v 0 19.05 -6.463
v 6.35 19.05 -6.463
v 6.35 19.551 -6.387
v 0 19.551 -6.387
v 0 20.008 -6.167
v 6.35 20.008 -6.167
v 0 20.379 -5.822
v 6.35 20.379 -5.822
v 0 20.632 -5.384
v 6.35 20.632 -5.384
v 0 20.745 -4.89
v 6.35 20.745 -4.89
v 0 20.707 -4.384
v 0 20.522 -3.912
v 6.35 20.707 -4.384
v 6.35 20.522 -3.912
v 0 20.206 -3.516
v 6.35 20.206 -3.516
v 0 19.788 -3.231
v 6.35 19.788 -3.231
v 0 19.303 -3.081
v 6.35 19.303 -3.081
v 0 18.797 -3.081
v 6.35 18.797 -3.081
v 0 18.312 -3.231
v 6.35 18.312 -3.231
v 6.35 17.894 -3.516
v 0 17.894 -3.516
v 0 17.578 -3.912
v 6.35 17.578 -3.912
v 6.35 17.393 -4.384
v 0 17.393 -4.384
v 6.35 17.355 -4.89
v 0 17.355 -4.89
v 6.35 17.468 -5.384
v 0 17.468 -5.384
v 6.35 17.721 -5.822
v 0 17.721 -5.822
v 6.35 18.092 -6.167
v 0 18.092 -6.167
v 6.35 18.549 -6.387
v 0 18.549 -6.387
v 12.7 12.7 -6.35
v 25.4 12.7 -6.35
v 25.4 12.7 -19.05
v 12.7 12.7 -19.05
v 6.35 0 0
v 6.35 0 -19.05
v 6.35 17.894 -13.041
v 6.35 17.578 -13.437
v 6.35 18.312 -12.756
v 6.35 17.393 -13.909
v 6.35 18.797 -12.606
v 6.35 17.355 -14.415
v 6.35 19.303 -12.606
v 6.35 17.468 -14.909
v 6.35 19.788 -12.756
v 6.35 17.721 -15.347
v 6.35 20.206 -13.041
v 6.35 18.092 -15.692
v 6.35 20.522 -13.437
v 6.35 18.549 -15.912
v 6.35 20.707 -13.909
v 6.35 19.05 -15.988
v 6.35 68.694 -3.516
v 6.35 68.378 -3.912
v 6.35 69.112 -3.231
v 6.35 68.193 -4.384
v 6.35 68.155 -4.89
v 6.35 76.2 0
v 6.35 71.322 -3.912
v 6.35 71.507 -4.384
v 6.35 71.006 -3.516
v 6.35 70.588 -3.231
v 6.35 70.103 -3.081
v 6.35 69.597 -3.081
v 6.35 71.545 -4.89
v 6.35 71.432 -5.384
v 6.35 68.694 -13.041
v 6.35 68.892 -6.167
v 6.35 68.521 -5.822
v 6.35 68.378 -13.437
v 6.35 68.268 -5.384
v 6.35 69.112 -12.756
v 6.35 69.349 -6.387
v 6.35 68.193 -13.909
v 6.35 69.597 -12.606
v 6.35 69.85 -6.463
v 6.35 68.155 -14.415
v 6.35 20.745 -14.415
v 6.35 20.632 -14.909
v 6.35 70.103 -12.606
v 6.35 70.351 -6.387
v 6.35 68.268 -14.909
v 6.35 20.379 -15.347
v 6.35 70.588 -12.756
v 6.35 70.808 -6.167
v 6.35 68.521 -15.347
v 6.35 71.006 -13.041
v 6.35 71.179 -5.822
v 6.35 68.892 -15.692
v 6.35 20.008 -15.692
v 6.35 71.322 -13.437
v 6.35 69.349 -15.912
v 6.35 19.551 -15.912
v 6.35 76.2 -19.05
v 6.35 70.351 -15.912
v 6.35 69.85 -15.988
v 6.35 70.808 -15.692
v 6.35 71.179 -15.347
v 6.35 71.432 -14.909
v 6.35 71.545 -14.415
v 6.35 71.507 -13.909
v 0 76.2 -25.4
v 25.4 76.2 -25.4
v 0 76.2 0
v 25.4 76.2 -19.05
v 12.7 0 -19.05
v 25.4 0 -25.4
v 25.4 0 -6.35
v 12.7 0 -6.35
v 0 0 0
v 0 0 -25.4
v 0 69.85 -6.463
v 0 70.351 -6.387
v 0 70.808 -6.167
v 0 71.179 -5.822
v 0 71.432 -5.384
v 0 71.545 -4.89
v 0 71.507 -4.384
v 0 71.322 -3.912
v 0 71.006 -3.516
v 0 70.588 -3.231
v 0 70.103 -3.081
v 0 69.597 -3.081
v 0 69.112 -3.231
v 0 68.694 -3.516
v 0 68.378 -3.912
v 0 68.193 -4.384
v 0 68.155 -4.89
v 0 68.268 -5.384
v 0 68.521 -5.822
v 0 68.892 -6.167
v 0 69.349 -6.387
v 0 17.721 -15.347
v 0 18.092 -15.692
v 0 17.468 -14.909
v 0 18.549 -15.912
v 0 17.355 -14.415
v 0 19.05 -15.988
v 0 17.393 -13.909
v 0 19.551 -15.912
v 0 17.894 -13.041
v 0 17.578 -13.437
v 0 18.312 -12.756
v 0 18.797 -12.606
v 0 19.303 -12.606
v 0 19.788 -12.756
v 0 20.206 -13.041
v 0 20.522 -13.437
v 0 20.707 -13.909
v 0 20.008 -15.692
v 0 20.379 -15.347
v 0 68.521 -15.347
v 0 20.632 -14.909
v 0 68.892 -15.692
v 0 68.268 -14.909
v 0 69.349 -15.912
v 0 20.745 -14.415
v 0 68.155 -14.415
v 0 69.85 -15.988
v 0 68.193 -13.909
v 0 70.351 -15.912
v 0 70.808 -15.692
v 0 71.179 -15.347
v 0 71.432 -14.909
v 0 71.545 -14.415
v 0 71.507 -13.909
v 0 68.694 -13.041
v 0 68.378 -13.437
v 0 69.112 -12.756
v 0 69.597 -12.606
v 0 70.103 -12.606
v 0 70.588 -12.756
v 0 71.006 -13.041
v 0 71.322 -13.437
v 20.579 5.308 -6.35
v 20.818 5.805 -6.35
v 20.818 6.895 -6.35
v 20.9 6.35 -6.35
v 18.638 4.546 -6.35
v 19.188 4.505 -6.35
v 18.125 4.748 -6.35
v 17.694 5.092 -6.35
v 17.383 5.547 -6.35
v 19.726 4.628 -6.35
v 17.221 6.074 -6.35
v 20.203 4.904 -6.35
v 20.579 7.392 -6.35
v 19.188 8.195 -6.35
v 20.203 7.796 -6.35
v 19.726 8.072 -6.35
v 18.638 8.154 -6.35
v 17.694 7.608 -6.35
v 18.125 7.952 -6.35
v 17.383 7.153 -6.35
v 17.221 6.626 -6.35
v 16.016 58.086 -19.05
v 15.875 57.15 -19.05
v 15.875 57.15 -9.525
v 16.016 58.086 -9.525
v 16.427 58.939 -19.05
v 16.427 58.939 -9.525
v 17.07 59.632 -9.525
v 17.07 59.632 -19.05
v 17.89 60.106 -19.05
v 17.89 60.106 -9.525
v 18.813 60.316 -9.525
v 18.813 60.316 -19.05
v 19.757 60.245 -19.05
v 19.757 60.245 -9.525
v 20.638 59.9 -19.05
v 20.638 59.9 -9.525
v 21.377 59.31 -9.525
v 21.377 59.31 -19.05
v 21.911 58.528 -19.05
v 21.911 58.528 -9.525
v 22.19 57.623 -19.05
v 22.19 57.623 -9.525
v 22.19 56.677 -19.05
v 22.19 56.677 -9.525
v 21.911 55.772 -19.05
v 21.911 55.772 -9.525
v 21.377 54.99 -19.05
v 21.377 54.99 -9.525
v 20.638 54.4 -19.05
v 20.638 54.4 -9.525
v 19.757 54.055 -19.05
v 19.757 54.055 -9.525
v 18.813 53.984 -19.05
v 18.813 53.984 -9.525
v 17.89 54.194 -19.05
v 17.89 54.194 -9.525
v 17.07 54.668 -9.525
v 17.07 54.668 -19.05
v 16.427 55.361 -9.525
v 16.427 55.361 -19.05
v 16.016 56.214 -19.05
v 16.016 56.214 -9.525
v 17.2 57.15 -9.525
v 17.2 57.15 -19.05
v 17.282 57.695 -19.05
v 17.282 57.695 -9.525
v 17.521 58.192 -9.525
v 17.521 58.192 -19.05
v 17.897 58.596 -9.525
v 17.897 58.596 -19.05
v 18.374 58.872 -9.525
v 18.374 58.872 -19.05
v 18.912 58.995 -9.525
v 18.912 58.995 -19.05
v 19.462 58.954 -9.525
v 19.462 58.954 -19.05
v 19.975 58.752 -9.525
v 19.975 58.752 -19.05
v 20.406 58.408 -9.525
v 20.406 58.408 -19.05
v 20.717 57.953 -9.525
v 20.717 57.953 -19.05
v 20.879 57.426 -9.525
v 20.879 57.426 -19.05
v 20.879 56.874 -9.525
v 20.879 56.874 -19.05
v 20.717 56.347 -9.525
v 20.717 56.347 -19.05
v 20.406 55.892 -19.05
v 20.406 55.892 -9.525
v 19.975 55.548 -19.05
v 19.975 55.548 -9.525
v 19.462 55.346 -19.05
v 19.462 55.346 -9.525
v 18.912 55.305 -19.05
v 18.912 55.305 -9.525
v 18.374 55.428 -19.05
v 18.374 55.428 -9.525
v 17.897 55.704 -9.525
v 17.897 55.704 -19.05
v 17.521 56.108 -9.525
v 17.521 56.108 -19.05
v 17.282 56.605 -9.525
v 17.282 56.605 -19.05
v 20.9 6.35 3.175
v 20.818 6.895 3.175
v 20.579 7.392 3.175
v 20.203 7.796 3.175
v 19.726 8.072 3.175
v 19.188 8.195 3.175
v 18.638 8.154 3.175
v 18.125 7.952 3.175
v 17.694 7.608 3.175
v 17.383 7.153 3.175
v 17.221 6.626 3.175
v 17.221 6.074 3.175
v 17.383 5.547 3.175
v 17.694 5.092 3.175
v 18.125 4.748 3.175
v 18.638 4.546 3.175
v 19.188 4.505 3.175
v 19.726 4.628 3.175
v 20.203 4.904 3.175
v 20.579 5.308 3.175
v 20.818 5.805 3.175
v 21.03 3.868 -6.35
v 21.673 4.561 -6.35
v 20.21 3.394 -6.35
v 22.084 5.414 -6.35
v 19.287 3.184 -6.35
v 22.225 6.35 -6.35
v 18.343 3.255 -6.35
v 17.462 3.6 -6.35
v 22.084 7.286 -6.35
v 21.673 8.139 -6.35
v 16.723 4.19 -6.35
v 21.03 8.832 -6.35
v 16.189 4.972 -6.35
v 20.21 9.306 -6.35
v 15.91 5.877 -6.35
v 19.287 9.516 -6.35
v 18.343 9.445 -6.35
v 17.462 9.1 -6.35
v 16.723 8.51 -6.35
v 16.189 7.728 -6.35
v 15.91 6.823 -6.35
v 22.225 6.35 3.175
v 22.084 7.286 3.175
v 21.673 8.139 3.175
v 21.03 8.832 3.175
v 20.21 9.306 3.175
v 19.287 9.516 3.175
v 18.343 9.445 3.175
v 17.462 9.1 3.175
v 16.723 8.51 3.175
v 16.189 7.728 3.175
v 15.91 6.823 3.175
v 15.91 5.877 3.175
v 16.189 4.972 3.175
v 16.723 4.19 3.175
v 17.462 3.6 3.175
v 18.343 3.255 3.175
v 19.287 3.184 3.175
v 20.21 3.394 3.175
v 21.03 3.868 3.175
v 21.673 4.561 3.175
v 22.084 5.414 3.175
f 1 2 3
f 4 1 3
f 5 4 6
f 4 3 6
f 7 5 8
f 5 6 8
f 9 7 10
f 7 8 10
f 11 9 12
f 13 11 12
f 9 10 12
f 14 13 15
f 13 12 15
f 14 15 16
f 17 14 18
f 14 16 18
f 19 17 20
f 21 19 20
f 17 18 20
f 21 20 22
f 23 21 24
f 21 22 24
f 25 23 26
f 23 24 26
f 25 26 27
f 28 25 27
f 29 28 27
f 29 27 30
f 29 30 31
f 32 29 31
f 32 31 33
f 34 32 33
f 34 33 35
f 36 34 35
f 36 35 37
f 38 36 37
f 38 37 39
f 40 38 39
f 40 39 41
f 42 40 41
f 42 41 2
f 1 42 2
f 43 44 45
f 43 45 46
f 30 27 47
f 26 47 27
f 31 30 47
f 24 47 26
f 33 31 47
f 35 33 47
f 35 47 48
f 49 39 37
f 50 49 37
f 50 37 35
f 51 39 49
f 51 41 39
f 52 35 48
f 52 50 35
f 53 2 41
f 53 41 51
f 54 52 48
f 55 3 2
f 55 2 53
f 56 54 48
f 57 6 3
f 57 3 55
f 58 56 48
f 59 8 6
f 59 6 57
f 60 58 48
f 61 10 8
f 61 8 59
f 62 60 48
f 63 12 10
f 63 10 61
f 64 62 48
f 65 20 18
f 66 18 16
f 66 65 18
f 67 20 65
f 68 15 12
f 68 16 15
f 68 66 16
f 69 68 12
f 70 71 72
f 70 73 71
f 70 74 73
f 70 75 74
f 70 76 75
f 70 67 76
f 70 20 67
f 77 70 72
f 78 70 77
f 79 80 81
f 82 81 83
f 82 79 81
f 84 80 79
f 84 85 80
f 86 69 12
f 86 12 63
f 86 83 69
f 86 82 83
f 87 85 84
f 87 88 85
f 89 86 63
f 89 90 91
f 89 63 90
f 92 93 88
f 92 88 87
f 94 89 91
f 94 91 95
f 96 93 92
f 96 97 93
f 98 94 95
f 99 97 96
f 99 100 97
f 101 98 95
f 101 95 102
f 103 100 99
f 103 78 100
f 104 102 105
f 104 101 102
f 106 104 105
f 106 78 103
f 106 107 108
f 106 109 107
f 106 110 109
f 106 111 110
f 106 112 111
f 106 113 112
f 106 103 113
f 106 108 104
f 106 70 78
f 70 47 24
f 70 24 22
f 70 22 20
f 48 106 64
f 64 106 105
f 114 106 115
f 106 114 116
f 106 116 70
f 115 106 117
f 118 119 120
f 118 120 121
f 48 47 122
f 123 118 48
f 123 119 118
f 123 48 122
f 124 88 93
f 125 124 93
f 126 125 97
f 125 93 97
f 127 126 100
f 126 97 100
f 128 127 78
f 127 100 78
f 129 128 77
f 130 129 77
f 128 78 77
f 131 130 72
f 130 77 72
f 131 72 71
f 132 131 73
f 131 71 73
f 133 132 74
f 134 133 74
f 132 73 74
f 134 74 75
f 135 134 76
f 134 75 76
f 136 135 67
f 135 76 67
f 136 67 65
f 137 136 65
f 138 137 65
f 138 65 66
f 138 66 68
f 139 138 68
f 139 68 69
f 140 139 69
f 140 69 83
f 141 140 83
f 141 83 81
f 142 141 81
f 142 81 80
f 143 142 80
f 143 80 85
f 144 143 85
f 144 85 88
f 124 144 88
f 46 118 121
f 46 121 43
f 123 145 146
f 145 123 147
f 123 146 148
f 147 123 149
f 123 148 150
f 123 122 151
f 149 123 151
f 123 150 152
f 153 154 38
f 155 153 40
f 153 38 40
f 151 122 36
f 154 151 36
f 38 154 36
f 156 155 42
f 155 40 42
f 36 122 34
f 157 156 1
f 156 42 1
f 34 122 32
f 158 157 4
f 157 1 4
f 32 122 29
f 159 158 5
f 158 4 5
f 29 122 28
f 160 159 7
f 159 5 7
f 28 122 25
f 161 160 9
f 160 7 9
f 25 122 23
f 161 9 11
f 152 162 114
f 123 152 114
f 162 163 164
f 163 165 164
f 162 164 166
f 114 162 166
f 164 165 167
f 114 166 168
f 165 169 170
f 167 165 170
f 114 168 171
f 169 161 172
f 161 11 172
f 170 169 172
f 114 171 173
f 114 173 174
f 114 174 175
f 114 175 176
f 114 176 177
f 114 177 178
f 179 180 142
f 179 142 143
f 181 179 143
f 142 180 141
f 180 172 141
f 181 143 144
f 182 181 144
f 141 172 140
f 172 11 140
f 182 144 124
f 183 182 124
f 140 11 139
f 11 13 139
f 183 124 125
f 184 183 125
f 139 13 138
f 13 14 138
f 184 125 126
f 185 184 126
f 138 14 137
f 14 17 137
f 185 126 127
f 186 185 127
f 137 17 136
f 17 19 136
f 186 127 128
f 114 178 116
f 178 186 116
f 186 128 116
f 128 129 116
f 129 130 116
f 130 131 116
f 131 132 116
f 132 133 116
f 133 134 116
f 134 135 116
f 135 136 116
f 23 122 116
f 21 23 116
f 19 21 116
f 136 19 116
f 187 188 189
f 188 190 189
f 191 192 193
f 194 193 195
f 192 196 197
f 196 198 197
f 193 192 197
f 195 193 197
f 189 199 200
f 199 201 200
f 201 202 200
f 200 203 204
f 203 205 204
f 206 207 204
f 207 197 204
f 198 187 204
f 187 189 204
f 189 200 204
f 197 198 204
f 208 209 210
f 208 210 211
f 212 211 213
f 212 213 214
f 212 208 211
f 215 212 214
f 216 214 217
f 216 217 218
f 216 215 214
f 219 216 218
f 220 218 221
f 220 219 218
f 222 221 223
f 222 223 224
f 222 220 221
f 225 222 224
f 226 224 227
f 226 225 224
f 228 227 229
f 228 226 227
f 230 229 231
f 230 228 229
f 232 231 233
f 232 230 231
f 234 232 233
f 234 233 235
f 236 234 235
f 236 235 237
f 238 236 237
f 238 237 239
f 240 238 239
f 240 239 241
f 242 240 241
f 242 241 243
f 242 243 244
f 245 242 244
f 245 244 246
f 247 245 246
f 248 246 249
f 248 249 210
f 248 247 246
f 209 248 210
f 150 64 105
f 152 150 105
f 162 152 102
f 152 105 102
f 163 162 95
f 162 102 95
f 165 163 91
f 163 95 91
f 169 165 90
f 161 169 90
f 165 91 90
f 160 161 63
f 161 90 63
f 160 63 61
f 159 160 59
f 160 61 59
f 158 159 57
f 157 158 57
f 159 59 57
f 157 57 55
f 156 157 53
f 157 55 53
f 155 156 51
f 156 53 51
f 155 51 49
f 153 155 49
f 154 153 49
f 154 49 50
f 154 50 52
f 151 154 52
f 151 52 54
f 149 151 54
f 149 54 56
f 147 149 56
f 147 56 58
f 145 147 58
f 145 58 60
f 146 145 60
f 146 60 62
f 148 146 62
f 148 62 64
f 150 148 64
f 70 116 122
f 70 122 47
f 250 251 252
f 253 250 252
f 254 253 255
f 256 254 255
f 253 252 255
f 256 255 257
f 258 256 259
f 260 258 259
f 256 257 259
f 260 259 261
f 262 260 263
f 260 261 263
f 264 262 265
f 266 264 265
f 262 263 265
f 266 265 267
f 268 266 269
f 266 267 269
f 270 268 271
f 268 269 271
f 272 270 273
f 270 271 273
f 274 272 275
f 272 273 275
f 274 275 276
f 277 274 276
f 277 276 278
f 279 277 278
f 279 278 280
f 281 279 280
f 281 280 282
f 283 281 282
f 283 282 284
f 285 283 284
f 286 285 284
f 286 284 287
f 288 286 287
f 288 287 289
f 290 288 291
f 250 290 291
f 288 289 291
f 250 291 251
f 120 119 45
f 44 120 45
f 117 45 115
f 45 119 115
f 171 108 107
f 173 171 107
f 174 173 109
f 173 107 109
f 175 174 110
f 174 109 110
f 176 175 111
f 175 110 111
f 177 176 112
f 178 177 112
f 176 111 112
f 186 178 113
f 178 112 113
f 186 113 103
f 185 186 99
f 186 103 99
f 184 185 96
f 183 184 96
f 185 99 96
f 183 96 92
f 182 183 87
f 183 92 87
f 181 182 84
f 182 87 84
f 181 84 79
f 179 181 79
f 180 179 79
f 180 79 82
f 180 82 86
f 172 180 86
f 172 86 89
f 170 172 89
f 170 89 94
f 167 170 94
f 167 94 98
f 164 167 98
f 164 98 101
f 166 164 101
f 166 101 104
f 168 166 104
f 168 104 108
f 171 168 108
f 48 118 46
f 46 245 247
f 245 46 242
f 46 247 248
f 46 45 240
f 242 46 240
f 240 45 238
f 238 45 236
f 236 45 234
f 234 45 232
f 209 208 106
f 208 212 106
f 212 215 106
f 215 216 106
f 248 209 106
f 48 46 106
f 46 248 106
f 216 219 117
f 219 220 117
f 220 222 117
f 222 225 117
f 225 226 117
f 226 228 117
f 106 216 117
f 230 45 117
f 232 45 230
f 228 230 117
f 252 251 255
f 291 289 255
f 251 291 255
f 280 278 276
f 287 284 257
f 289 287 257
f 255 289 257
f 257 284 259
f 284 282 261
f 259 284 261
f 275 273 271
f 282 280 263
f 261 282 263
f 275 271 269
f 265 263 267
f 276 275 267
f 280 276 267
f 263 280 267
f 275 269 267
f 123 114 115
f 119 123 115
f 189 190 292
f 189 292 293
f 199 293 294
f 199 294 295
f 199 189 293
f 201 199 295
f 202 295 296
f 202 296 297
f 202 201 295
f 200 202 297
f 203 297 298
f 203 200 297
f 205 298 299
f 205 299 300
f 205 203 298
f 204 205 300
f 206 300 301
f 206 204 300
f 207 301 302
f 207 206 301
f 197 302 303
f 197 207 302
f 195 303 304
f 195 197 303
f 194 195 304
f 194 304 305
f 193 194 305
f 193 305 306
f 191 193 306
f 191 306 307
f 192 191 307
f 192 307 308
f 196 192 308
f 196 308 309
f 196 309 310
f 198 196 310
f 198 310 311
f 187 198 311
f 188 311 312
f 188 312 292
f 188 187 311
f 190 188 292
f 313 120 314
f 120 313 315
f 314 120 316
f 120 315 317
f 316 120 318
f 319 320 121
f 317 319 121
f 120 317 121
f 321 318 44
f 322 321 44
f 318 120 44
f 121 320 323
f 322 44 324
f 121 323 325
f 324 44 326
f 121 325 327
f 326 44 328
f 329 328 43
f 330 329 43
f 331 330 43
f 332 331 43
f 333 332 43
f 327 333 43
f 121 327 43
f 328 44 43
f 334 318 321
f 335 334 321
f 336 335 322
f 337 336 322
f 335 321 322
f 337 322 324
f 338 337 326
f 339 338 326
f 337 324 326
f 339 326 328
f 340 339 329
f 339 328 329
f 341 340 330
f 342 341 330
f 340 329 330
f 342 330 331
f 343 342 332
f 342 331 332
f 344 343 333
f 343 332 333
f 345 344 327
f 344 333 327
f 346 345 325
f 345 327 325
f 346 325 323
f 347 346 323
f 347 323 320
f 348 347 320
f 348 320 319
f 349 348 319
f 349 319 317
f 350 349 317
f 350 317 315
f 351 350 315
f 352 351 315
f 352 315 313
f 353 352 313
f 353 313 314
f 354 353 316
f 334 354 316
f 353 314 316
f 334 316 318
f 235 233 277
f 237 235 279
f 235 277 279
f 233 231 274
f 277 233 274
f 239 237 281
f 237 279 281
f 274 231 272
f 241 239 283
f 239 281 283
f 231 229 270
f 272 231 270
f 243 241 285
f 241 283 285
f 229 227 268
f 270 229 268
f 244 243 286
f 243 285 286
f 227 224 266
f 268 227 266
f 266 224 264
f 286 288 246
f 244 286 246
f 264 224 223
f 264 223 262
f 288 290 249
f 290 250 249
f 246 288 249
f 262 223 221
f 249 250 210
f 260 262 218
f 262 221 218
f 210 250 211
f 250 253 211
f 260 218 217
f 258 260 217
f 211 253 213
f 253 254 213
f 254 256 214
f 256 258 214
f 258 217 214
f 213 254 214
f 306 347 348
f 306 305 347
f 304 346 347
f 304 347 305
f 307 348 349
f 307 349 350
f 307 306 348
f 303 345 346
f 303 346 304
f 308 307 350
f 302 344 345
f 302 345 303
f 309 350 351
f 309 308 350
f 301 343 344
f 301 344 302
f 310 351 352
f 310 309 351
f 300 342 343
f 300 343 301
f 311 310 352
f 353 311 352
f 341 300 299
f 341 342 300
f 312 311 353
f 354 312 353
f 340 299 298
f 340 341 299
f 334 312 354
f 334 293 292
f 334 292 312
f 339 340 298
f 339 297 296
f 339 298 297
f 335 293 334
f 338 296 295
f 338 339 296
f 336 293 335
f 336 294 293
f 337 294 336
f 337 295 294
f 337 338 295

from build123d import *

# Parameters (mm, degrees)
SKETCH1_W           = 25.4
SKETCH1_H           = 76.2
BOSS_EXTRUDE1_DEPTH = 25.4
SKETCH10_W          = 19.05
SKETCH10_H          = 76.2
CUT_EXTRUDE5_DEPTH  = 19.05
BOSS_EXTRUDE2_START = -6.35
SKETCH12_R          = 3.175
SKETCH12_R_2        = 1.849999983
BOSS_EXTRUDE2_DEPTH = 9.525
BOSS_EXTRUDE3_START = -6.35
SKETCH13_W          = 12.7
SKETCH13_H          = 12.7
BOSS_EXTRUDE3_DEPTH = 12.7
SKETCH14_R          = 3.175
SKETCH14_R_2        = 1.849999983
BOSS_EXTRUDE4_DEPTH = 9.525
SKETCH15_R          = 1.700000029
CUT_EXTRUDE6_DEPTH  = 7.35


with BuildPart() as part:
    # Sketch1 → Boss-Extrude1 (new body)
    with BuildSketch(Plane.XY):
        with Locations((12.7, 38.1)):
            Rectangle(SKETCH1_W, SKETCH1_H)
    extrude(amount=-BOSS_EXTRUDE1_DEPTH)

    # Sketch10 → Cut-Extrude5 (cut)
    with BuildSketch(Plane(origin=(25.4, 0, 0), x_dir=(0, 0, -1), z_dir=(1, 0, 0))):
        with Locations((9.525, 38.1)):
            Rectangle(SKETCH10_W, SKETCH10_H)
    extrude(amount=-CUT_EXTRUDE5_DEPTH, mode=Mode.SUBTRACT)

    # Sketch12 → Boss-Extrude2 (add)
    with BuildSketch(Plane(origin=(0, 0, -25.4), x_dir=(-1, 0, 0), z_dir=(0, 0, -1)).offset(BOSS_EXTRUDE2_START)):
        with Locations((-19.05, 57.15)):
            Circle(SKETCH12_R)
        with Locations((-19.05, 57.15)):
            Circle(SKETCH12_R_2, mode=Mode.SUBTRACT)
    extrude(amount=-BOSS_EXTRUDE2_DEPTH)

    # Sketch13 → Boss-Extrude3 (add)
    with BuildSketch(Plane(origin=(0, 0, -25.4), x_dir=(-1, 0, 0), z_dir=(0, 0, -1)).offset(BOSS_EXTRUDE3_START)):
        with Locations((-19.05, 6.35)):
            Rectangle(SKETCH13_W, SKETCH13_H)
    extrude(amount=-BOSS_EXTRUDE3_DEPTH)

    # Sketch14 → Boss-Extrude4 (add)
    with BuildSketch(Plane.XY.offset(-6.35)):
        with Locations((19.05, 6.35)):
            Circle(SKETCH14_R)
        with Locations((19.05, 6.35)):
            Circle(SKETCH14_R_2, mode=Mode.SUBTRACT)
    extrude(amount=BOSS_EXTRUDE4_DEPTH)

    # Sketch15 → Cut-Extrude6 (cut, through all)
    with BuildSketch(Plane(origin=(6.35, 0, 0), x_dir=(0, 0, -1), z_dir=(1, 0, 0))):
        with Locations((4.7625, 69.85)):
            Circle(SKETCH15_R)
        with Locations((14.2875, 69.85)):
            Circle(SKETCH15_R)
        with Locations((4.7625, 19.05)):
            Circle(SKETCH15_R)
        with Locations((14.2875, 19.05)):
            Circle(SKETCH15_R)
    extrude(amount=-CUT_EXTRUDE6_DEPTH, mode=Mode.SUBTRACT)


solid = part.part
